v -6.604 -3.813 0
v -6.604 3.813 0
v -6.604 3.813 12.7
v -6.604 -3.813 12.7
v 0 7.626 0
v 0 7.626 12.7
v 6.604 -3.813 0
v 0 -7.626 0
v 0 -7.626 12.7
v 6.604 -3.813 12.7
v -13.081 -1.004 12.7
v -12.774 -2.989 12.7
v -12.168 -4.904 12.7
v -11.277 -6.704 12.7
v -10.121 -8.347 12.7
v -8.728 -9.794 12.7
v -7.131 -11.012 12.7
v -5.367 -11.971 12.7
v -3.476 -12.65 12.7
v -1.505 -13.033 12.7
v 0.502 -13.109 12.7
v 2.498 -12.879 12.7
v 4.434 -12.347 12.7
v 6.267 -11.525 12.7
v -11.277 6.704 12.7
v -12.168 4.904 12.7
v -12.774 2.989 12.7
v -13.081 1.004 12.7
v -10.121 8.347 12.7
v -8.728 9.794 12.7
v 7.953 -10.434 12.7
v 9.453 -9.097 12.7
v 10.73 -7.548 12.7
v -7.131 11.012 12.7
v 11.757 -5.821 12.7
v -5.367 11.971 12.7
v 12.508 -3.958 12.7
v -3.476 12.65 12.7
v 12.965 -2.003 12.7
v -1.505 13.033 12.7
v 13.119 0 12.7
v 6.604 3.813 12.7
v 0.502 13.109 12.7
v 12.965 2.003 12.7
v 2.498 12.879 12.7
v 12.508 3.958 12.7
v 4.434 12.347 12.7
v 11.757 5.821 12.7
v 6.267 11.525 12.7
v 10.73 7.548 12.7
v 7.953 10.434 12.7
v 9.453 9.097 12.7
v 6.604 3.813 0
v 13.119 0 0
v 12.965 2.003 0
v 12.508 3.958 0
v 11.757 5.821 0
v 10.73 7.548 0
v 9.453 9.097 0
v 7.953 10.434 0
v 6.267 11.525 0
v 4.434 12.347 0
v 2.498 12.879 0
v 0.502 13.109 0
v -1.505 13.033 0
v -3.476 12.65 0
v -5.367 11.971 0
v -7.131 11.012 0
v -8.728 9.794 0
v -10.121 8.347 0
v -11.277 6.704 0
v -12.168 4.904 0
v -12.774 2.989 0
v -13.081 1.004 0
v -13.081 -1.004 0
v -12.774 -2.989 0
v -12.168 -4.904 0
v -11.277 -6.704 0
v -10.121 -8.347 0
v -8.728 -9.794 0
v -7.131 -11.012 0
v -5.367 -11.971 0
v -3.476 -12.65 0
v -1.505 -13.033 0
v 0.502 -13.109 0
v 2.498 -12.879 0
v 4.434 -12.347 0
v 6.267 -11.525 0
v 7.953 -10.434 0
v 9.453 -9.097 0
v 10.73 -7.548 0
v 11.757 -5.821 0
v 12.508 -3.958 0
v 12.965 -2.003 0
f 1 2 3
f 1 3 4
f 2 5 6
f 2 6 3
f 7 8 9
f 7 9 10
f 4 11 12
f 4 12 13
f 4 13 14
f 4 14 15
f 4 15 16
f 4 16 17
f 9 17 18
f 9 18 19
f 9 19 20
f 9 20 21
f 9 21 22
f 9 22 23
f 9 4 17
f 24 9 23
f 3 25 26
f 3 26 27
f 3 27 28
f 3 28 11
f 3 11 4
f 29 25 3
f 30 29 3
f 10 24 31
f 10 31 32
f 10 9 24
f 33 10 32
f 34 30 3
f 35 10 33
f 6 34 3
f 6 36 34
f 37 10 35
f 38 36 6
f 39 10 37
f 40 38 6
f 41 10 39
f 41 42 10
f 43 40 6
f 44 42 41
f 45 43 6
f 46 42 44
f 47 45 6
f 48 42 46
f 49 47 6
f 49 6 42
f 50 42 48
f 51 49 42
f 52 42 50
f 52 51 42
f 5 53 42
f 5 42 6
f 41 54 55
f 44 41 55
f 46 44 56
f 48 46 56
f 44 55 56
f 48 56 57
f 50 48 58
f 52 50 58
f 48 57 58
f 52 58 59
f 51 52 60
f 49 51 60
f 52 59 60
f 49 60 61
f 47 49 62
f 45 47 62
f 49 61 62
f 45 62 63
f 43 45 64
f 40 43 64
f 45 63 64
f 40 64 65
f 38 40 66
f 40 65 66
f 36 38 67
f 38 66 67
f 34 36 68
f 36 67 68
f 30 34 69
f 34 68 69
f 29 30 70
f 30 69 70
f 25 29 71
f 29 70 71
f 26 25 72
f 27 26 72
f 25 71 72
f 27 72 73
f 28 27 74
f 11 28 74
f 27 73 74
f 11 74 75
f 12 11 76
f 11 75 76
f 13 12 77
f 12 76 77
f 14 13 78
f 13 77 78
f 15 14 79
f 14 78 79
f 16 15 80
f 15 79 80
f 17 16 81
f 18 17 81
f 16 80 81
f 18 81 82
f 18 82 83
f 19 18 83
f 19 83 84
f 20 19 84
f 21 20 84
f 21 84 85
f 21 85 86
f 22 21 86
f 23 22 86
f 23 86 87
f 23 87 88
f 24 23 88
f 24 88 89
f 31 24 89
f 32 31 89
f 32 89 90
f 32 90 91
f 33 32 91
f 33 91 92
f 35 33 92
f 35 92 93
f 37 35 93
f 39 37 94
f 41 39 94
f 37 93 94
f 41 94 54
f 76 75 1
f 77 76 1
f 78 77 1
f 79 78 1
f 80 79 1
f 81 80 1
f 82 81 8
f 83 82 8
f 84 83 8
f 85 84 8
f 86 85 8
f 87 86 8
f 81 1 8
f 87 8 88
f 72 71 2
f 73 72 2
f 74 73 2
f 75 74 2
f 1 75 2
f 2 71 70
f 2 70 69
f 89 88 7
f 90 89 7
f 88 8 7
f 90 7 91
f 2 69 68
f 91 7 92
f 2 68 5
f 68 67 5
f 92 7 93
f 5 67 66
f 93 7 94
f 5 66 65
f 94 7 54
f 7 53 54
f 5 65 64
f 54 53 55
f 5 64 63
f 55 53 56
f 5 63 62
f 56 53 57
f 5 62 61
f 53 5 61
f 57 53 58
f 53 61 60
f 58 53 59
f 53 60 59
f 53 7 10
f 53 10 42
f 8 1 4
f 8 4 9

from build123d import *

# Parameters (mm, degrees)
F0_R     = 13.1191
F1_DEPTH = 12.7
F3_DEPTH = 36.322


# Not quite as in the source:
# - a length typed as a fraction of an inch, garbled in the dataset ("3 / 203.2 mm" for 3/8 in), is restored


with BuildPart() as f1:
    # F0 (on Top) → F1 (new body)
    with BuildSketch(Plane.XY):
        Circle(F0_R)
    extrude(amount=F1_DEPTH)

    # F2 (on Top) → F3 (cut)
    with BuildSketch(Plane.XY):
        Polygon((6.604, -3.8128211777), (6.604, 3.8128211777), (0, 7.6256423555), (-6.604, 3.8128211777), (-6.604, -3.8128211777), (0, -7.6256423555), align=None)
    extrude(amount=F3_DEPTH, mode=Mode.SUBTRACT)


solid = f1.part
